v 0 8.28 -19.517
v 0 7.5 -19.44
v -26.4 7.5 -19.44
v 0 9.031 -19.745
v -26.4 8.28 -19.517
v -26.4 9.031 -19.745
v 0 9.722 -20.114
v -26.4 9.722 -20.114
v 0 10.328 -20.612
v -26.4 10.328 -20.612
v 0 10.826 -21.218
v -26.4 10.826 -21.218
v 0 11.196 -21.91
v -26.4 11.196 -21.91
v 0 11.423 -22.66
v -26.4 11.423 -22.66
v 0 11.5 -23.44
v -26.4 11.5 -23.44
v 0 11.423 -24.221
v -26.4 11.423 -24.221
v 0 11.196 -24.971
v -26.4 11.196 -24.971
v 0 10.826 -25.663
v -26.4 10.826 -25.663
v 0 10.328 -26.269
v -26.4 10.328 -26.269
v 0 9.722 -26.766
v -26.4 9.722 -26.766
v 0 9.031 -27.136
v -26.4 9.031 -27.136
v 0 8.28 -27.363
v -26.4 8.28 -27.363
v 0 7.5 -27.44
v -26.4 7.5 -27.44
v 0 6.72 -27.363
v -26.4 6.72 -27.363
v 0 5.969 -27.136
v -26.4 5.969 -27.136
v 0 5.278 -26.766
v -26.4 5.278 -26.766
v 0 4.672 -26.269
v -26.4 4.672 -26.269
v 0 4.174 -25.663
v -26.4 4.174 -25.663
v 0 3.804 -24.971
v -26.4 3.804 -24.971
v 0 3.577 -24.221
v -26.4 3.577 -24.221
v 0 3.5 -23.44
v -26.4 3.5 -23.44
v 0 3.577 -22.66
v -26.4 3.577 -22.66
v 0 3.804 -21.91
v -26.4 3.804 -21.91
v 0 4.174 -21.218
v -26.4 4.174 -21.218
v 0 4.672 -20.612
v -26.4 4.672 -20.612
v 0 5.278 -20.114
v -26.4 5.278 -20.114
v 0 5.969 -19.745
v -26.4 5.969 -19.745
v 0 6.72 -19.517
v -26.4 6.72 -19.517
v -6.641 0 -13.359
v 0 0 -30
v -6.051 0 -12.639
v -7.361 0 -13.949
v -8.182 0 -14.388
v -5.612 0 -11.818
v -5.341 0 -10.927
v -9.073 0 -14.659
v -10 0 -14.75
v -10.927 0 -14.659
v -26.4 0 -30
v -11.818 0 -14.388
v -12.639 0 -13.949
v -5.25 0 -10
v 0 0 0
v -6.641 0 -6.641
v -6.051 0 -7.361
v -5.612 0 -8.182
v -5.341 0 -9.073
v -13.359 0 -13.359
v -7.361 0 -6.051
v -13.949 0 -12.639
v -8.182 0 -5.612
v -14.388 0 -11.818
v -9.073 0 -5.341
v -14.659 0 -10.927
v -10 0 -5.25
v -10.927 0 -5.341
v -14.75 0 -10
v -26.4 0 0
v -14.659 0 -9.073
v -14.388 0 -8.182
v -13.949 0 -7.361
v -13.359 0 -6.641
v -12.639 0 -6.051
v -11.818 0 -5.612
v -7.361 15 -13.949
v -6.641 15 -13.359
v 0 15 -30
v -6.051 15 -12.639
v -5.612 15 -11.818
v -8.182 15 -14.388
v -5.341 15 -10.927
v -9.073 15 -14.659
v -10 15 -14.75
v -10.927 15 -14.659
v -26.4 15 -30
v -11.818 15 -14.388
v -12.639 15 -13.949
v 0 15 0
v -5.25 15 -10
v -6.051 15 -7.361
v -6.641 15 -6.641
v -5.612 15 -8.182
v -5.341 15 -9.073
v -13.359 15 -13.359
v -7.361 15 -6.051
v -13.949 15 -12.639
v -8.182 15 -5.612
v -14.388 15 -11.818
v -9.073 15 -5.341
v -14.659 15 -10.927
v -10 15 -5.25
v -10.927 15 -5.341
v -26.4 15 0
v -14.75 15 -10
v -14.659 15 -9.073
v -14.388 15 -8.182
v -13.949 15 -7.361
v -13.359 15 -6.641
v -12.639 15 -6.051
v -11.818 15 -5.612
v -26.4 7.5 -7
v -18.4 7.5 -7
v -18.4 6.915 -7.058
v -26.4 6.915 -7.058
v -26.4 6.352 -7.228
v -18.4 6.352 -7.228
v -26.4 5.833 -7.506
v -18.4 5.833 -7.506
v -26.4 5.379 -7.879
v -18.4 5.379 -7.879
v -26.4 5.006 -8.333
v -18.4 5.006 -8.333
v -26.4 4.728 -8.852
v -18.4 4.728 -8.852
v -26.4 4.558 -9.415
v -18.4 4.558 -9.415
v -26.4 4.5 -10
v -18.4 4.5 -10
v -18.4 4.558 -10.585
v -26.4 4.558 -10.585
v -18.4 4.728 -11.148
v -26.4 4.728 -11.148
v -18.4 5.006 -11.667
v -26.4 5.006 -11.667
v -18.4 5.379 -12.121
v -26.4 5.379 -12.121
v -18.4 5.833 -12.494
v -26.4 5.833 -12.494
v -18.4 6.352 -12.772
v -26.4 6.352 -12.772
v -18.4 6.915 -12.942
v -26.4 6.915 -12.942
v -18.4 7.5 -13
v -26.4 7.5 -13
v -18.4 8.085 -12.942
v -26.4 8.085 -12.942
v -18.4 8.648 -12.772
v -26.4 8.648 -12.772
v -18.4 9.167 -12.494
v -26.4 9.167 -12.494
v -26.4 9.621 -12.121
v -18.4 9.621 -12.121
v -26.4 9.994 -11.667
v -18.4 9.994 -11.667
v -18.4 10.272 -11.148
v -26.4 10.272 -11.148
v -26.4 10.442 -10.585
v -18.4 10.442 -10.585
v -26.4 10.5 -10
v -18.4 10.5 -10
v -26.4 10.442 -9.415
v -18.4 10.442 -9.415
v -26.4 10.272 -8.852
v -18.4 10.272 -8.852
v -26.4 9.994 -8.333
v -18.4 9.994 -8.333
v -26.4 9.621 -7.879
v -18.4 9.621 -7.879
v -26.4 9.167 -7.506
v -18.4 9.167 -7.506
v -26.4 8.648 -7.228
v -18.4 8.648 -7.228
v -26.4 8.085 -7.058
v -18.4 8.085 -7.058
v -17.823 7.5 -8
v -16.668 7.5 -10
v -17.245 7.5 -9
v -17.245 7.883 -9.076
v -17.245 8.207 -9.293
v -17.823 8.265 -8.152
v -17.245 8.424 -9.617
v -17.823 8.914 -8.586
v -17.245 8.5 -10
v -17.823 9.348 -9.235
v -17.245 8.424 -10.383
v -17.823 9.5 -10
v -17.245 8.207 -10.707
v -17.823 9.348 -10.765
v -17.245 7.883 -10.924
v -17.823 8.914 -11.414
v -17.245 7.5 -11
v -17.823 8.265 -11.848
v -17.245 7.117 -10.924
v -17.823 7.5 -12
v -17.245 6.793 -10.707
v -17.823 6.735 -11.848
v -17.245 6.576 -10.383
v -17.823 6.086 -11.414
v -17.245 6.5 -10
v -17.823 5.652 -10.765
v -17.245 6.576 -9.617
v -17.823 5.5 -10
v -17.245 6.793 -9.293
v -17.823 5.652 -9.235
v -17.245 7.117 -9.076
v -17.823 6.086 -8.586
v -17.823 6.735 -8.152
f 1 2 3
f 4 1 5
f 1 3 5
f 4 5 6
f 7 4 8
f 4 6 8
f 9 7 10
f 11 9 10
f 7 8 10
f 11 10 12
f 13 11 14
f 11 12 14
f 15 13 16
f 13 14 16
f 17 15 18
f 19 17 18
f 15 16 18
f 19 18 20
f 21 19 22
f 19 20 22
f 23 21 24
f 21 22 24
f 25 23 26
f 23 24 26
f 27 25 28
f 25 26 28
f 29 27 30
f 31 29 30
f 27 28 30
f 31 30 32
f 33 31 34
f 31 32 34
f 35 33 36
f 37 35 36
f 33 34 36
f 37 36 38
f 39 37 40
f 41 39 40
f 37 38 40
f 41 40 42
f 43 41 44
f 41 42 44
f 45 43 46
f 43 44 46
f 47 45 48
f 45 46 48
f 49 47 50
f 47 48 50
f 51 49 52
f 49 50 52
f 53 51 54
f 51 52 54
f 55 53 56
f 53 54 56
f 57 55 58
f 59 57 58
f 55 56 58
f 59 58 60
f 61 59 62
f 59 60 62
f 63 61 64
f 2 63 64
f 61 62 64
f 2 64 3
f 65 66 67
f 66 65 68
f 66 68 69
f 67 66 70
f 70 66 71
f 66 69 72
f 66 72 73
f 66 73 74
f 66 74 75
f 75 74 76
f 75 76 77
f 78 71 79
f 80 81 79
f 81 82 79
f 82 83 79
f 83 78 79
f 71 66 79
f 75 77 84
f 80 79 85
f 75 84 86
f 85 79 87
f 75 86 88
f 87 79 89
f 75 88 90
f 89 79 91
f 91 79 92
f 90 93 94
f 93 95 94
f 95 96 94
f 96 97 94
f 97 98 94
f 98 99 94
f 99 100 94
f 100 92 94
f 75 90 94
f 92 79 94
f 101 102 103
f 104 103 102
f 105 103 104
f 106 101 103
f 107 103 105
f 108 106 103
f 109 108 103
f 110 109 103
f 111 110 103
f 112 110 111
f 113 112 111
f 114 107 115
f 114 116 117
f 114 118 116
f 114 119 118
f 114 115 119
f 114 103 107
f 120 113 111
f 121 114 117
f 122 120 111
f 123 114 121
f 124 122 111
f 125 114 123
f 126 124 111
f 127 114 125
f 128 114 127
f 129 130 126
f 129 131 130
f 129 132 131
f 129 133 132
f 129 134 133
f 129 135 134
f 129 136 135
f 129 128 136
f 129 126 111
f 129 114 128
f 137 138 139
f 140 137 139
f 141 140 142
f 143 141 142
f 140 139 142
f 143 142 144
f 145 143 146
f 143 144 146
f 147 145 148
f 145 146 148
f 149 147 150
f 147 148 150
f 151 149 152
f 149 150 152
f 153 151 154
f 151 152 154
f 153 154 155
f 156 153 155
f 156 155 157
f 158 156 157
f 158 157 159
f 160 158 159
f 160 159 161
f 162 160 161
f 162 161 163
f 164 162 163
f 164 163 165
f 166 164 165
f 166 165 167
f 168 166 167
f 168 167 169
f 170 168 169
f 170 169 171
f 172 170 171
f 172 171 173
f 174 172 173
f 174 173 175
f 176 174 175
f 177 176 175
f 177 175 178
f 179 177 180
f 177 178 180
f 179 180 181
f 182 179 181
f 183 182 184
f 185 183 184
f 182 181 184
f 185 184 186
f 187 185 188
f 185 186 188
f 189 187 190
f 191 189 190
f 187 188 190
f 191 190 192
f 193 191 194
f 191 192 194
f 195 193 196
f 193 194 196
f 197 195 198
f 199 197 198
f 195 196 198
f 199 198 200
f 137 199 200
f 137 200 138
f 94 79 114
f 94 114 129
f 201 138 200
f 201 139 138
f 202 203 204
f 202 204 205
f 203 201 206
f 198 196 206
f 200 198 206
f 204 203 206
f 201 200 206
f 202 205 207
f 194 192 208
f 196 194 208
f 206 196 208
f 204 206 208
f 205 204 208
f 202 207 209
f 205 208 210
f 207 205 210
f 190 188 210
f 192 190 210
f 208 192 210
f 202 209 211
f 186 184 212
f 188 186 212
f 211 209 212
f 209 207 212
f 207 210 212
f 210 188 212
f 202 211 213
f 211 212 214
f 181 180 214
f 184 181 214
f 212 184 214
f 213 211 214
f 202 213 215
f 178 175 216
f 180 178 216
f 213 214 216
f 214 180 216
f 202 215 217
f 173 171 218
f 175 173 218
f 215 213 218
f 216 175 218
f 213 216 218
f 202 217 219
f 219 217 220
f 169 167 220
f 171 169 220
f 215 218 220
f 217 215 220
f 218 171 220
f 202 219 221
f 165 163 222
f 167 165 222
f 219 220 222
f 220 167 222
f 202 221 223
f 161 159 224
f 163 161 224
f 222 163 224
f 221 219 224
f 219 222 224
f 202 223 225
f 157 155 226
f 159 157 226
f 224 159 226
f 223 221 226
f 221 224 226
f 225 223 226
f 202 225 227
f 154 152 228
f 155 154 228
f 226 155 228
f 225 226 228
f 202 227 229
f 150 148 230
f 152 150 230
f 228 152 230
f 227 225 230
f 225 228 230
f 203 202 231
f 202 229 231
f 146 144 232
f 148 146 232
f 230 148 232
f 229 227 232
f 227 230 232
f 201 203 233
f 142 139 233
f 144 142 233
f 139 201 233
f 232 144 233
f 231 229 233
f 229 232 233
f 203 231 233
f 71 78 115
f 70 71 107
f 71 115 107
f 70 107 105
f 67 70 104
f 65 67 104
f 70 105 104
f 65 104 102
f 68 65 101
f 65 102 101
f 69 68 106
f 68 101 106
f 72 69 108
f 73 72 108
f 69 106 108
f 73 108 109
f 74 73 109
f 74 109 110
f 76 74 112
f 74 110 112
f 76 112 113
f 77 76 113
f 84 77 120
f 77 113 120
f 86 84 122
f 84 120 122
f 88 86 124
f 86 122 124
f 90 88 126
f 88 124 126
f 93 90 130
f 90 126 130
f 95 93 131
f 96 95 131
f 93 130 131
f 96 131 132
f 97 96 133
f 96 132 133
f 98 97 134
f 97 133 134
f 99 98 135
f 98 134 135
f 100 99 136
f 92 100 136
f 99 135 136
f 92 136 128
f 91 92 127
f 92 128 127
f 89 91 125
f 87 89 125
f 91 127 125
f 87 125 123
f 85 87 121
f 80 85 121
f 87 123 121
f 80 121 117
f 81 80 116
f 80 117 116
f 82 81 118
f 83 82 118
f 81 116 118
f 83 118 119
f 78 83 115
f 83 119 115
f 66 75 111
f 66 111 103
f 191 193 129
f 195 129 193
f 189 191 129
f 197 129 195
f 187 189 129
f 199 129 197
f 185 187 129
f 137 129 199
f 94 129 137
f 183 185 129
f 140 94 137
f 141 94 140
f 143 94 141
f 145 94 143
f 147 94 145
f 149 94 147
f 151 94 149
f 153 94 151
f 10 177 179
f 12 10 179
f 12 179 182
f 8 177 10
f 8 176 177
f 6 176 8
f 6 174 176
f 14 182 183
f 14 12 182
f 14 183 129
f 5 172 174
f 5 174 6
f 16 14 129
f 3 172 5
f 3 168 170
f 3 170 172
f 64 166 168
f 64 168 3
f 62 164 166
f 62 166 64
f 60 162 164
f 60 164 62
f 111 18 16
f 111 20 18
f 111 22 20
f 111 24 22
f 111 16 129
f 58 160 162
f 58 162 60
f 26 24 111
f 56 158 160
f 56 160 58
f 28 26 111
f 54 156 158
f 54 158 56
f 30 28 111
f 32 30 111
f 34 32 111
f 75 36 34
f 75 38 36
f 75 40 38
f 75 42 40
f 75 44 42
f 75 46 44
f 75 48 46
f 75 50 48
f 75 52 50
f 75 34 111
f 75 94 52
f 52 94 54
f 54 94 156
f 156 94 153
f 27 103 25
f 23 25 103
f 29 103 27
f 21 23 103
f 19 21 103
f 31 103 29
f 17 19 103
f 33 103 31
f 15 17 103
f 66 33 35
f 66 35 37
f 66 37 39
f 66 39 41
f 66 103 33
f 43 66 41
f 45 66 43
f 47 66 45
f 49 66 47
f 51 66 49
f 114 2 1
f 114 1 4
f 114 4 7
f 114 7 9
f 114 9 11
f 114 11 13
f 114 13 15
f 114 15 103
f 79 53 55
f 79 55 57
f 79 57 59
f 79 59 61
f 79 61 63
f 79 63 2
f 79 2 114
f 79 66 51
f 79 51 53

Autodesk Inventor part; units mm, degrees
ref_plane "YZ Plane" through (0, 0, 0) normal (1, 0, 0) x (0, 1, 0)
ref_plane "XZ Plane" through (0, 0, 0) normal (0, 1, 0) x (-1, 0, 0)
ref_plane "XY Plane" through (0, 0, 0) normal (0, 0, 1) x (1, 0, 0)
sketch "Sketch1" plane through (0, 0, 0) normal (0, 1, 0) x (-1, 0, 0)
  line L0 (0, 0) -> (26.4, 0)
  line L1 (26.4, 0) -> (26.4, -30)
  line L2 (26.4, -30) -> (0, -30)
  line L3 (0, -30) -> (0, 0)
  dimension "d0" = 26.4
  dimension "d1" = 30
extrude "Extrusion1" add sketch "Sketch1" along normal blind 15
sketch "Sketch2" plane through (0, 15, 0) normal (0, 1, 0) x (1, 0, 0)
  circle A0 centre (-10, 10) radius 4.75
  line L0 (0, 0) -> (0, 30) projected
  line L1 (-26.4, 0) -> (0, 0) projected
  dimension "d4" = 9.5
  dimension "d5" = 10
  dimension "d6" = 10
extrude "Extrusion2" cut sketch "Sketch2" against normal blind 15
sketch "Sketch3" plane through (-26.4, 0, -30) normal (-1, 0, 0) x (0, 0, 1)
  line L0 (24.75, 0) -> (15.25, 0) projected
  line L1 (15.25, 15) -> (24.75, 15) projected
  line L2 (24.75, 15) -> (24.75, 0) projected
  line L3 (15.25, 15) -> (15.25, 0) projected
  circle A0 centre (20, 7.5) radius 2
  point P0 (30, 0)
  dimension "d12" = 4
hole "Hole1" at (-26.4, 7.5, -10) direction (1, 0, 0) diameter 6 depth 8 tip angle 120
sketch "Sketch4" plane through (-26.4, 0, -30) normal (-1, 0, 0) x (0, 0, 1)
  line L0 (0, 0) -> (0, 15) projected
  circle A0 centre (6.5597, 7.5) radius 4
  point P0 (30, 0)
  dimension "d20" = 8
extrude "Extrusion3" cut sketch "Sketch4" against normal blind 32.75
thread "Thread1" size "M10x1.5" class "6H" standard "ANSI Metric M Profile" full length
thread "Thread2" size "M8x1.25" class "6H" standard "ANSI Metric M Profile" full length
properties part number "КВ33.000.109 - Каретка"
